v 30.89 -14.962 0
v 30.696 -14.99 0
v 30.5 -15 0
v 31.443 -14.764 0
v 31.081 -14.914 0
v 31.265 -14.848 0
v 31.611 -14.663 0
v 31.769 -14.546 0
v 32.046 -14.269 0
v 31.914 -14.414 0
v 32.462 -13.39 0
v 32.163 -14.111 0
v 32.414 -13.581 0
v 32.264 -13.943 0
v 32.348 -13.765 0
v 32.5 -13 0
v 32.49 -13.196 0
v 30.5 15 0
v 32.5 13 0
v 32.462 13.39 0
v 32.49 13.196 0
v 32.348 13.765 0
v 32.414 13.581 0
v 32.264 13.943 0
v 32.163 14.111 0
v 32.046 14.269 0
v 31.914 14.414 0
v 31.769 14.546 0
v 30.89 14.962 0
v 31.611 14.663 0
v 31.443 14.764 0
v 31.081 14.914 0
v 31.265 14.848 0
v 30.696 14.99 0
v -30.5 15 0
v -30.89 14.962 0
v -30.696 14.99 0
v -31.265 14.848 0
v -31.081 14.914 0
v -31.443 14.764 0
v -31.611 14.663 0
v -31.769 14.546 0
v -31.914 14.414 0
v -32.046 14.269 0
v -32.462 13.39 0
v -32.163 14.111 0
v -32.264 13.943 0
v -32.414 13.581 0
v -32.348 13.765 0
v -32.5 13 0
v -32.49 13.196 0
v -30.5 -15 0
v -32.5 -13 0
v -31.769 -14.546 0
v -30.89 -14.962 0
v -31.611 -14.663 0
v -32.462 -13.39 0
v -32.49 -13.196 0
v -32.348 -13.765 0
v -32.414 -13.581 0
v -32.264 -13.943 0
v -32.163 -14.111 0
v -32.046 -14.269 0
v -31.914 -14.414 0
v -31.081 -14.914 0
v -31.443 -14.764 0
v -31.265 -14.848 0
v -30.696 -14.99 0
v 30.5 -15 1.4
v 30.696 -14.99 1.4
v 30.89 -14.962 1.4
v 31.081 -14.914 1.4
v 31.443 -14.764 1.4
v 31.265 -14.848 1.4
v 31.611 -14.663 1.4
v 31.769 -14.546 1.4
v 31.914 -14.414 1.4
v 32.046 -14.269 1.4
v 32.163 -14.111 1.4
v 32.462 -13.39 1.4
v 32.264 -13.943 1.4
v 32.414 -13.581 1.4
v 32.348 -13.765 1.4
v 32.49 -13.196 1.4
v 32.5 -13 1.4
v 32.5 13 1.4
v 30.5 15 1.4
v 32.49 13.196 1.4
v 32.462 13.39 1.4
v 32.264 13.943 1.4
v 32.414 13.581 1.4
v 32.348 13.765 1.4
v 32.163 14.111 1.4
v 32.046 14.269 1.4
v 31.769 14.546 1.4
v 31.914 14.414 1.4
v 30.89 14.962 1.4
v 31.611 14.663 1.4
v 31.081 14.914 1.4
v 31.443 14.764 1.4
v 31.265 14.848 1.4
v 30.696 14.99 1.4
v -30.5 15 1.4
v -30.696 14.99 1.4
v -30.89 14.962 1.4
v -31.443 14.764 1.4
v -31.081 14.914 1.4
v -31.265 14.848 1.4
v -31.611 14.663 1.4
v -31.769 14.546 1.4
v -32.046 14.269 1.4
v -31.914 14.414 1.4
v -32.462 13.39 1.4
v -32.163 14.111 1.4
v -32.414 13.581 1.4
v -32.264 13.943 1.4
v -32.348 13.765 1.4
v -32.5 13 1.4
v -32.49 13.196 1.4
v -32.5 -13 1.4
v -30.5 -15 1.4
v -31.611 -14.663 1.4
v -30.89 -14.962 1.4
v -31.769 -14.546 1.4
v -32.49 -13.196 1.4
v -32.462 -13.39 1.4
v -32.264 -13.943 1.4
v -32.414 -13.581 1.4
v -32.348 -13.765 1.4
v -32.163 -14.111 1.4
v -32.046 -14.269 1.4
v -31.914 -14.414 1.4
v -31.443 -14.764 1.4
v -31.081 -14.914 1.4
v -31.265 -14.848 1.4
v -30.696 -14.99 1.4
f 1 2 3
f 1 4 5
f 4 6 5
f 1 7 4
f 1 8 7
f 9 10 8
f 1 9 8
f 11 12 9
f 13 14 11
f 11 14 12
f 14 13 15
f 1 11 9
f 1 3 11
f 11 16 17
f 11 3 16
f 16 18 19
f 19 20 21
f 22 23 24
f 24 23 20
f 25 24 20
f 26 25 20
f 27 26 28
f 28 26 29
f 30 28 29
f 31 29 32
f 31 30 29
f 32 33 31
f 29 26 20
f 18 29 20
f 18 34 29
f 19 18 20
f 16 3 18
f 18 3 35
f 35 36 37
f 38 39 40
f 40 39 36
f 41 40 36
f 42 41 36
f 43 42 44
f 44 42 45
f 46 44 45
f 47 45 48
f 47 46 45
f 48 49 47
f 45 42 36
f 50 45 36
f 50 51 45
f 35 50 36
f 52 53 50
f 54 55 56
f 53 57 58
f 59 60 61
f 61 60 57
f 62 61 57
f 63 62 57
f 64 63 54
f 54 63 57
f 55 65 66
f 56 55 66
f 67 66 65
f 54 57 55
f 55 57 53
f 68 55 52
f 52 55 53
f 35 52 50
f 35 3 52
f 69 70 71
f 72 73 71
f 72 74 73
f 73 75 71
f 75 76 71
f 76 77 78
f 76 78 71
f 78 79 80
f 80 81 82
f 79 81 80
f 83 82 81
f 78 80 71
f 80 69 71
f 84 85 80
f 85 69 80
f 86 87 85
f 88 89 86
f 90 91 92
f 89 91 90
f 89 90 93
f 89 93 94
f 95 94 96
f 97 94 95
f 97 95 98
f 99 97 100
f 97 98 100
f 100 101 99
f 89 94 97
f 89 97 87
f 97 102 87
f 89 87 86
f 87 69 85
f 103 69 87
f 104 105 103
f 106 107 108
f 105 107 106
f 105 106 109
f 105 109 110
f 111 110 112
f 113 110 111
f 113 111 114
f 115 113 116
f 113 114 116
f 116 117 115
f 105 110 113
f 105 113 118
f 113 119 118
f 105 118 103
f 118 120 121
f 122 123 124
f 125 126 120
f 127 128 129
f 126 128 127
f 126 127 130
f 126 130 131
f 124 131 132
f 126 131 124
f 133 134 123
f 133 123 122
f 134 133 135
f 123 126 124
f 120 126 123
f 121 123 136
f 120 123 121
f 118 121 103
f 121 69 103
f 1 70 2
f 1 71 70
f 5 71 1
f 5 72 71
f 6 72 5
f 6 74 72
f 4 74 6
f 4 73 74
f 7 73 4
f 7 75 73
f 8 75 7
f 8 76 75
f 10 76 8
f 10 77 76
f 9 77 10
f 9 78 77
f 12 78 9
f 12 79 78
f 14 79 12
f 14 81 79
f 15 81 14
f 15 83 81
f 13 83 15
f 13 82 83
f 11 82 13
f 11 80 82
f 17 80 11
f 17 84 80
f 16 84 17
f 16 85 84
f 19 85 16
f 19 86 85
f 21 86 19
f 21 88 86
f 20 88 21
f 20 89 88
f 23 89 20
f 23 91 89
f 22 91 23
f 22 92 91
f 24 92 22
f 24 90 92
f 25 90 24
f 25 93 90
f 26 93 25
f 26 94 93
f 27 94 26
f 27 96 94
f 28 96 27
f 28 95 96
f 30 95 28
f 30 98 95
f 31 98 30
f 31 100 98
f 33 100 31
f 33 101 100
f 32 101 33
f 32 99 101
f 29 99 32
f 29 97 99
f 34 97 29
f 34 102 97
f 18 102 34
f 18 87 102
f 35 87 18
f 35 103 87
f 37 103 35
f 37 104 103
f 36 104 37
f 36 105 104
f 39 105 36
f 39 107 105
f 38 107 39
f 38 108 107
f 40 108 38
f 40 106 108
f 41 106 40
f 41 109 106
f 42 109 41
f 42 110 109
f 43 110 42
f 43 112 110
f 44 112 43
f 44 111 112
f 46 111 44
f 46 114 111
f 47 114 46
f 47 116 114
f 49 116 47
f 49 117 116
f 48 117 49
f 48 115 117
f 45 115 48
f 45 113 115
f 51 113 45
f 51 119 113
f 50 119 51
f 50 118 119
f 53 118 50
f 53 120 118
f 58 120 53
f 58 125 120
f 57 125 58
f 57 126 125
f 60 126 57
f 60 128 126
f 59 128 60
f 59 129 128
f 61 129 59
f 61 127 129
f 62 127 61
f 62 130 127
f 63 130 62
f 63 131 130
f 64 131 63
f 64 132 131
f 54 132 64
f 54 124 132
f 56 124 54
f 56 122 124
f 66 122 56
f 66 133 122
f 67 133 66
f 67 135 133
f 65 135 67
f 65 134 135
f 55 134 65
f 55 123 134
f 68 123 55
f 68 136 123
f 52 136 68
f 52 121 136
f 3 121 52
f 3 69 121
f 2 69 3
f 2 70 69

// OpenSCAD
$fn = 64;

board_x = 65.0;
board_y = 30.0;
board_z = 1.4;

corner_r = 2.0;

module rounded_board(x, y, z, r) {
    r2 = min(r, min(x, y)/2);
    linear_extrude(height = z)
        offset(r = r2)
            square([x - 2*r2, y - 2*r2], center = true);
}

color([0.05, 0.45, 0.15])
    rounded_board(board_x, board_y, board_z, corner_r);
